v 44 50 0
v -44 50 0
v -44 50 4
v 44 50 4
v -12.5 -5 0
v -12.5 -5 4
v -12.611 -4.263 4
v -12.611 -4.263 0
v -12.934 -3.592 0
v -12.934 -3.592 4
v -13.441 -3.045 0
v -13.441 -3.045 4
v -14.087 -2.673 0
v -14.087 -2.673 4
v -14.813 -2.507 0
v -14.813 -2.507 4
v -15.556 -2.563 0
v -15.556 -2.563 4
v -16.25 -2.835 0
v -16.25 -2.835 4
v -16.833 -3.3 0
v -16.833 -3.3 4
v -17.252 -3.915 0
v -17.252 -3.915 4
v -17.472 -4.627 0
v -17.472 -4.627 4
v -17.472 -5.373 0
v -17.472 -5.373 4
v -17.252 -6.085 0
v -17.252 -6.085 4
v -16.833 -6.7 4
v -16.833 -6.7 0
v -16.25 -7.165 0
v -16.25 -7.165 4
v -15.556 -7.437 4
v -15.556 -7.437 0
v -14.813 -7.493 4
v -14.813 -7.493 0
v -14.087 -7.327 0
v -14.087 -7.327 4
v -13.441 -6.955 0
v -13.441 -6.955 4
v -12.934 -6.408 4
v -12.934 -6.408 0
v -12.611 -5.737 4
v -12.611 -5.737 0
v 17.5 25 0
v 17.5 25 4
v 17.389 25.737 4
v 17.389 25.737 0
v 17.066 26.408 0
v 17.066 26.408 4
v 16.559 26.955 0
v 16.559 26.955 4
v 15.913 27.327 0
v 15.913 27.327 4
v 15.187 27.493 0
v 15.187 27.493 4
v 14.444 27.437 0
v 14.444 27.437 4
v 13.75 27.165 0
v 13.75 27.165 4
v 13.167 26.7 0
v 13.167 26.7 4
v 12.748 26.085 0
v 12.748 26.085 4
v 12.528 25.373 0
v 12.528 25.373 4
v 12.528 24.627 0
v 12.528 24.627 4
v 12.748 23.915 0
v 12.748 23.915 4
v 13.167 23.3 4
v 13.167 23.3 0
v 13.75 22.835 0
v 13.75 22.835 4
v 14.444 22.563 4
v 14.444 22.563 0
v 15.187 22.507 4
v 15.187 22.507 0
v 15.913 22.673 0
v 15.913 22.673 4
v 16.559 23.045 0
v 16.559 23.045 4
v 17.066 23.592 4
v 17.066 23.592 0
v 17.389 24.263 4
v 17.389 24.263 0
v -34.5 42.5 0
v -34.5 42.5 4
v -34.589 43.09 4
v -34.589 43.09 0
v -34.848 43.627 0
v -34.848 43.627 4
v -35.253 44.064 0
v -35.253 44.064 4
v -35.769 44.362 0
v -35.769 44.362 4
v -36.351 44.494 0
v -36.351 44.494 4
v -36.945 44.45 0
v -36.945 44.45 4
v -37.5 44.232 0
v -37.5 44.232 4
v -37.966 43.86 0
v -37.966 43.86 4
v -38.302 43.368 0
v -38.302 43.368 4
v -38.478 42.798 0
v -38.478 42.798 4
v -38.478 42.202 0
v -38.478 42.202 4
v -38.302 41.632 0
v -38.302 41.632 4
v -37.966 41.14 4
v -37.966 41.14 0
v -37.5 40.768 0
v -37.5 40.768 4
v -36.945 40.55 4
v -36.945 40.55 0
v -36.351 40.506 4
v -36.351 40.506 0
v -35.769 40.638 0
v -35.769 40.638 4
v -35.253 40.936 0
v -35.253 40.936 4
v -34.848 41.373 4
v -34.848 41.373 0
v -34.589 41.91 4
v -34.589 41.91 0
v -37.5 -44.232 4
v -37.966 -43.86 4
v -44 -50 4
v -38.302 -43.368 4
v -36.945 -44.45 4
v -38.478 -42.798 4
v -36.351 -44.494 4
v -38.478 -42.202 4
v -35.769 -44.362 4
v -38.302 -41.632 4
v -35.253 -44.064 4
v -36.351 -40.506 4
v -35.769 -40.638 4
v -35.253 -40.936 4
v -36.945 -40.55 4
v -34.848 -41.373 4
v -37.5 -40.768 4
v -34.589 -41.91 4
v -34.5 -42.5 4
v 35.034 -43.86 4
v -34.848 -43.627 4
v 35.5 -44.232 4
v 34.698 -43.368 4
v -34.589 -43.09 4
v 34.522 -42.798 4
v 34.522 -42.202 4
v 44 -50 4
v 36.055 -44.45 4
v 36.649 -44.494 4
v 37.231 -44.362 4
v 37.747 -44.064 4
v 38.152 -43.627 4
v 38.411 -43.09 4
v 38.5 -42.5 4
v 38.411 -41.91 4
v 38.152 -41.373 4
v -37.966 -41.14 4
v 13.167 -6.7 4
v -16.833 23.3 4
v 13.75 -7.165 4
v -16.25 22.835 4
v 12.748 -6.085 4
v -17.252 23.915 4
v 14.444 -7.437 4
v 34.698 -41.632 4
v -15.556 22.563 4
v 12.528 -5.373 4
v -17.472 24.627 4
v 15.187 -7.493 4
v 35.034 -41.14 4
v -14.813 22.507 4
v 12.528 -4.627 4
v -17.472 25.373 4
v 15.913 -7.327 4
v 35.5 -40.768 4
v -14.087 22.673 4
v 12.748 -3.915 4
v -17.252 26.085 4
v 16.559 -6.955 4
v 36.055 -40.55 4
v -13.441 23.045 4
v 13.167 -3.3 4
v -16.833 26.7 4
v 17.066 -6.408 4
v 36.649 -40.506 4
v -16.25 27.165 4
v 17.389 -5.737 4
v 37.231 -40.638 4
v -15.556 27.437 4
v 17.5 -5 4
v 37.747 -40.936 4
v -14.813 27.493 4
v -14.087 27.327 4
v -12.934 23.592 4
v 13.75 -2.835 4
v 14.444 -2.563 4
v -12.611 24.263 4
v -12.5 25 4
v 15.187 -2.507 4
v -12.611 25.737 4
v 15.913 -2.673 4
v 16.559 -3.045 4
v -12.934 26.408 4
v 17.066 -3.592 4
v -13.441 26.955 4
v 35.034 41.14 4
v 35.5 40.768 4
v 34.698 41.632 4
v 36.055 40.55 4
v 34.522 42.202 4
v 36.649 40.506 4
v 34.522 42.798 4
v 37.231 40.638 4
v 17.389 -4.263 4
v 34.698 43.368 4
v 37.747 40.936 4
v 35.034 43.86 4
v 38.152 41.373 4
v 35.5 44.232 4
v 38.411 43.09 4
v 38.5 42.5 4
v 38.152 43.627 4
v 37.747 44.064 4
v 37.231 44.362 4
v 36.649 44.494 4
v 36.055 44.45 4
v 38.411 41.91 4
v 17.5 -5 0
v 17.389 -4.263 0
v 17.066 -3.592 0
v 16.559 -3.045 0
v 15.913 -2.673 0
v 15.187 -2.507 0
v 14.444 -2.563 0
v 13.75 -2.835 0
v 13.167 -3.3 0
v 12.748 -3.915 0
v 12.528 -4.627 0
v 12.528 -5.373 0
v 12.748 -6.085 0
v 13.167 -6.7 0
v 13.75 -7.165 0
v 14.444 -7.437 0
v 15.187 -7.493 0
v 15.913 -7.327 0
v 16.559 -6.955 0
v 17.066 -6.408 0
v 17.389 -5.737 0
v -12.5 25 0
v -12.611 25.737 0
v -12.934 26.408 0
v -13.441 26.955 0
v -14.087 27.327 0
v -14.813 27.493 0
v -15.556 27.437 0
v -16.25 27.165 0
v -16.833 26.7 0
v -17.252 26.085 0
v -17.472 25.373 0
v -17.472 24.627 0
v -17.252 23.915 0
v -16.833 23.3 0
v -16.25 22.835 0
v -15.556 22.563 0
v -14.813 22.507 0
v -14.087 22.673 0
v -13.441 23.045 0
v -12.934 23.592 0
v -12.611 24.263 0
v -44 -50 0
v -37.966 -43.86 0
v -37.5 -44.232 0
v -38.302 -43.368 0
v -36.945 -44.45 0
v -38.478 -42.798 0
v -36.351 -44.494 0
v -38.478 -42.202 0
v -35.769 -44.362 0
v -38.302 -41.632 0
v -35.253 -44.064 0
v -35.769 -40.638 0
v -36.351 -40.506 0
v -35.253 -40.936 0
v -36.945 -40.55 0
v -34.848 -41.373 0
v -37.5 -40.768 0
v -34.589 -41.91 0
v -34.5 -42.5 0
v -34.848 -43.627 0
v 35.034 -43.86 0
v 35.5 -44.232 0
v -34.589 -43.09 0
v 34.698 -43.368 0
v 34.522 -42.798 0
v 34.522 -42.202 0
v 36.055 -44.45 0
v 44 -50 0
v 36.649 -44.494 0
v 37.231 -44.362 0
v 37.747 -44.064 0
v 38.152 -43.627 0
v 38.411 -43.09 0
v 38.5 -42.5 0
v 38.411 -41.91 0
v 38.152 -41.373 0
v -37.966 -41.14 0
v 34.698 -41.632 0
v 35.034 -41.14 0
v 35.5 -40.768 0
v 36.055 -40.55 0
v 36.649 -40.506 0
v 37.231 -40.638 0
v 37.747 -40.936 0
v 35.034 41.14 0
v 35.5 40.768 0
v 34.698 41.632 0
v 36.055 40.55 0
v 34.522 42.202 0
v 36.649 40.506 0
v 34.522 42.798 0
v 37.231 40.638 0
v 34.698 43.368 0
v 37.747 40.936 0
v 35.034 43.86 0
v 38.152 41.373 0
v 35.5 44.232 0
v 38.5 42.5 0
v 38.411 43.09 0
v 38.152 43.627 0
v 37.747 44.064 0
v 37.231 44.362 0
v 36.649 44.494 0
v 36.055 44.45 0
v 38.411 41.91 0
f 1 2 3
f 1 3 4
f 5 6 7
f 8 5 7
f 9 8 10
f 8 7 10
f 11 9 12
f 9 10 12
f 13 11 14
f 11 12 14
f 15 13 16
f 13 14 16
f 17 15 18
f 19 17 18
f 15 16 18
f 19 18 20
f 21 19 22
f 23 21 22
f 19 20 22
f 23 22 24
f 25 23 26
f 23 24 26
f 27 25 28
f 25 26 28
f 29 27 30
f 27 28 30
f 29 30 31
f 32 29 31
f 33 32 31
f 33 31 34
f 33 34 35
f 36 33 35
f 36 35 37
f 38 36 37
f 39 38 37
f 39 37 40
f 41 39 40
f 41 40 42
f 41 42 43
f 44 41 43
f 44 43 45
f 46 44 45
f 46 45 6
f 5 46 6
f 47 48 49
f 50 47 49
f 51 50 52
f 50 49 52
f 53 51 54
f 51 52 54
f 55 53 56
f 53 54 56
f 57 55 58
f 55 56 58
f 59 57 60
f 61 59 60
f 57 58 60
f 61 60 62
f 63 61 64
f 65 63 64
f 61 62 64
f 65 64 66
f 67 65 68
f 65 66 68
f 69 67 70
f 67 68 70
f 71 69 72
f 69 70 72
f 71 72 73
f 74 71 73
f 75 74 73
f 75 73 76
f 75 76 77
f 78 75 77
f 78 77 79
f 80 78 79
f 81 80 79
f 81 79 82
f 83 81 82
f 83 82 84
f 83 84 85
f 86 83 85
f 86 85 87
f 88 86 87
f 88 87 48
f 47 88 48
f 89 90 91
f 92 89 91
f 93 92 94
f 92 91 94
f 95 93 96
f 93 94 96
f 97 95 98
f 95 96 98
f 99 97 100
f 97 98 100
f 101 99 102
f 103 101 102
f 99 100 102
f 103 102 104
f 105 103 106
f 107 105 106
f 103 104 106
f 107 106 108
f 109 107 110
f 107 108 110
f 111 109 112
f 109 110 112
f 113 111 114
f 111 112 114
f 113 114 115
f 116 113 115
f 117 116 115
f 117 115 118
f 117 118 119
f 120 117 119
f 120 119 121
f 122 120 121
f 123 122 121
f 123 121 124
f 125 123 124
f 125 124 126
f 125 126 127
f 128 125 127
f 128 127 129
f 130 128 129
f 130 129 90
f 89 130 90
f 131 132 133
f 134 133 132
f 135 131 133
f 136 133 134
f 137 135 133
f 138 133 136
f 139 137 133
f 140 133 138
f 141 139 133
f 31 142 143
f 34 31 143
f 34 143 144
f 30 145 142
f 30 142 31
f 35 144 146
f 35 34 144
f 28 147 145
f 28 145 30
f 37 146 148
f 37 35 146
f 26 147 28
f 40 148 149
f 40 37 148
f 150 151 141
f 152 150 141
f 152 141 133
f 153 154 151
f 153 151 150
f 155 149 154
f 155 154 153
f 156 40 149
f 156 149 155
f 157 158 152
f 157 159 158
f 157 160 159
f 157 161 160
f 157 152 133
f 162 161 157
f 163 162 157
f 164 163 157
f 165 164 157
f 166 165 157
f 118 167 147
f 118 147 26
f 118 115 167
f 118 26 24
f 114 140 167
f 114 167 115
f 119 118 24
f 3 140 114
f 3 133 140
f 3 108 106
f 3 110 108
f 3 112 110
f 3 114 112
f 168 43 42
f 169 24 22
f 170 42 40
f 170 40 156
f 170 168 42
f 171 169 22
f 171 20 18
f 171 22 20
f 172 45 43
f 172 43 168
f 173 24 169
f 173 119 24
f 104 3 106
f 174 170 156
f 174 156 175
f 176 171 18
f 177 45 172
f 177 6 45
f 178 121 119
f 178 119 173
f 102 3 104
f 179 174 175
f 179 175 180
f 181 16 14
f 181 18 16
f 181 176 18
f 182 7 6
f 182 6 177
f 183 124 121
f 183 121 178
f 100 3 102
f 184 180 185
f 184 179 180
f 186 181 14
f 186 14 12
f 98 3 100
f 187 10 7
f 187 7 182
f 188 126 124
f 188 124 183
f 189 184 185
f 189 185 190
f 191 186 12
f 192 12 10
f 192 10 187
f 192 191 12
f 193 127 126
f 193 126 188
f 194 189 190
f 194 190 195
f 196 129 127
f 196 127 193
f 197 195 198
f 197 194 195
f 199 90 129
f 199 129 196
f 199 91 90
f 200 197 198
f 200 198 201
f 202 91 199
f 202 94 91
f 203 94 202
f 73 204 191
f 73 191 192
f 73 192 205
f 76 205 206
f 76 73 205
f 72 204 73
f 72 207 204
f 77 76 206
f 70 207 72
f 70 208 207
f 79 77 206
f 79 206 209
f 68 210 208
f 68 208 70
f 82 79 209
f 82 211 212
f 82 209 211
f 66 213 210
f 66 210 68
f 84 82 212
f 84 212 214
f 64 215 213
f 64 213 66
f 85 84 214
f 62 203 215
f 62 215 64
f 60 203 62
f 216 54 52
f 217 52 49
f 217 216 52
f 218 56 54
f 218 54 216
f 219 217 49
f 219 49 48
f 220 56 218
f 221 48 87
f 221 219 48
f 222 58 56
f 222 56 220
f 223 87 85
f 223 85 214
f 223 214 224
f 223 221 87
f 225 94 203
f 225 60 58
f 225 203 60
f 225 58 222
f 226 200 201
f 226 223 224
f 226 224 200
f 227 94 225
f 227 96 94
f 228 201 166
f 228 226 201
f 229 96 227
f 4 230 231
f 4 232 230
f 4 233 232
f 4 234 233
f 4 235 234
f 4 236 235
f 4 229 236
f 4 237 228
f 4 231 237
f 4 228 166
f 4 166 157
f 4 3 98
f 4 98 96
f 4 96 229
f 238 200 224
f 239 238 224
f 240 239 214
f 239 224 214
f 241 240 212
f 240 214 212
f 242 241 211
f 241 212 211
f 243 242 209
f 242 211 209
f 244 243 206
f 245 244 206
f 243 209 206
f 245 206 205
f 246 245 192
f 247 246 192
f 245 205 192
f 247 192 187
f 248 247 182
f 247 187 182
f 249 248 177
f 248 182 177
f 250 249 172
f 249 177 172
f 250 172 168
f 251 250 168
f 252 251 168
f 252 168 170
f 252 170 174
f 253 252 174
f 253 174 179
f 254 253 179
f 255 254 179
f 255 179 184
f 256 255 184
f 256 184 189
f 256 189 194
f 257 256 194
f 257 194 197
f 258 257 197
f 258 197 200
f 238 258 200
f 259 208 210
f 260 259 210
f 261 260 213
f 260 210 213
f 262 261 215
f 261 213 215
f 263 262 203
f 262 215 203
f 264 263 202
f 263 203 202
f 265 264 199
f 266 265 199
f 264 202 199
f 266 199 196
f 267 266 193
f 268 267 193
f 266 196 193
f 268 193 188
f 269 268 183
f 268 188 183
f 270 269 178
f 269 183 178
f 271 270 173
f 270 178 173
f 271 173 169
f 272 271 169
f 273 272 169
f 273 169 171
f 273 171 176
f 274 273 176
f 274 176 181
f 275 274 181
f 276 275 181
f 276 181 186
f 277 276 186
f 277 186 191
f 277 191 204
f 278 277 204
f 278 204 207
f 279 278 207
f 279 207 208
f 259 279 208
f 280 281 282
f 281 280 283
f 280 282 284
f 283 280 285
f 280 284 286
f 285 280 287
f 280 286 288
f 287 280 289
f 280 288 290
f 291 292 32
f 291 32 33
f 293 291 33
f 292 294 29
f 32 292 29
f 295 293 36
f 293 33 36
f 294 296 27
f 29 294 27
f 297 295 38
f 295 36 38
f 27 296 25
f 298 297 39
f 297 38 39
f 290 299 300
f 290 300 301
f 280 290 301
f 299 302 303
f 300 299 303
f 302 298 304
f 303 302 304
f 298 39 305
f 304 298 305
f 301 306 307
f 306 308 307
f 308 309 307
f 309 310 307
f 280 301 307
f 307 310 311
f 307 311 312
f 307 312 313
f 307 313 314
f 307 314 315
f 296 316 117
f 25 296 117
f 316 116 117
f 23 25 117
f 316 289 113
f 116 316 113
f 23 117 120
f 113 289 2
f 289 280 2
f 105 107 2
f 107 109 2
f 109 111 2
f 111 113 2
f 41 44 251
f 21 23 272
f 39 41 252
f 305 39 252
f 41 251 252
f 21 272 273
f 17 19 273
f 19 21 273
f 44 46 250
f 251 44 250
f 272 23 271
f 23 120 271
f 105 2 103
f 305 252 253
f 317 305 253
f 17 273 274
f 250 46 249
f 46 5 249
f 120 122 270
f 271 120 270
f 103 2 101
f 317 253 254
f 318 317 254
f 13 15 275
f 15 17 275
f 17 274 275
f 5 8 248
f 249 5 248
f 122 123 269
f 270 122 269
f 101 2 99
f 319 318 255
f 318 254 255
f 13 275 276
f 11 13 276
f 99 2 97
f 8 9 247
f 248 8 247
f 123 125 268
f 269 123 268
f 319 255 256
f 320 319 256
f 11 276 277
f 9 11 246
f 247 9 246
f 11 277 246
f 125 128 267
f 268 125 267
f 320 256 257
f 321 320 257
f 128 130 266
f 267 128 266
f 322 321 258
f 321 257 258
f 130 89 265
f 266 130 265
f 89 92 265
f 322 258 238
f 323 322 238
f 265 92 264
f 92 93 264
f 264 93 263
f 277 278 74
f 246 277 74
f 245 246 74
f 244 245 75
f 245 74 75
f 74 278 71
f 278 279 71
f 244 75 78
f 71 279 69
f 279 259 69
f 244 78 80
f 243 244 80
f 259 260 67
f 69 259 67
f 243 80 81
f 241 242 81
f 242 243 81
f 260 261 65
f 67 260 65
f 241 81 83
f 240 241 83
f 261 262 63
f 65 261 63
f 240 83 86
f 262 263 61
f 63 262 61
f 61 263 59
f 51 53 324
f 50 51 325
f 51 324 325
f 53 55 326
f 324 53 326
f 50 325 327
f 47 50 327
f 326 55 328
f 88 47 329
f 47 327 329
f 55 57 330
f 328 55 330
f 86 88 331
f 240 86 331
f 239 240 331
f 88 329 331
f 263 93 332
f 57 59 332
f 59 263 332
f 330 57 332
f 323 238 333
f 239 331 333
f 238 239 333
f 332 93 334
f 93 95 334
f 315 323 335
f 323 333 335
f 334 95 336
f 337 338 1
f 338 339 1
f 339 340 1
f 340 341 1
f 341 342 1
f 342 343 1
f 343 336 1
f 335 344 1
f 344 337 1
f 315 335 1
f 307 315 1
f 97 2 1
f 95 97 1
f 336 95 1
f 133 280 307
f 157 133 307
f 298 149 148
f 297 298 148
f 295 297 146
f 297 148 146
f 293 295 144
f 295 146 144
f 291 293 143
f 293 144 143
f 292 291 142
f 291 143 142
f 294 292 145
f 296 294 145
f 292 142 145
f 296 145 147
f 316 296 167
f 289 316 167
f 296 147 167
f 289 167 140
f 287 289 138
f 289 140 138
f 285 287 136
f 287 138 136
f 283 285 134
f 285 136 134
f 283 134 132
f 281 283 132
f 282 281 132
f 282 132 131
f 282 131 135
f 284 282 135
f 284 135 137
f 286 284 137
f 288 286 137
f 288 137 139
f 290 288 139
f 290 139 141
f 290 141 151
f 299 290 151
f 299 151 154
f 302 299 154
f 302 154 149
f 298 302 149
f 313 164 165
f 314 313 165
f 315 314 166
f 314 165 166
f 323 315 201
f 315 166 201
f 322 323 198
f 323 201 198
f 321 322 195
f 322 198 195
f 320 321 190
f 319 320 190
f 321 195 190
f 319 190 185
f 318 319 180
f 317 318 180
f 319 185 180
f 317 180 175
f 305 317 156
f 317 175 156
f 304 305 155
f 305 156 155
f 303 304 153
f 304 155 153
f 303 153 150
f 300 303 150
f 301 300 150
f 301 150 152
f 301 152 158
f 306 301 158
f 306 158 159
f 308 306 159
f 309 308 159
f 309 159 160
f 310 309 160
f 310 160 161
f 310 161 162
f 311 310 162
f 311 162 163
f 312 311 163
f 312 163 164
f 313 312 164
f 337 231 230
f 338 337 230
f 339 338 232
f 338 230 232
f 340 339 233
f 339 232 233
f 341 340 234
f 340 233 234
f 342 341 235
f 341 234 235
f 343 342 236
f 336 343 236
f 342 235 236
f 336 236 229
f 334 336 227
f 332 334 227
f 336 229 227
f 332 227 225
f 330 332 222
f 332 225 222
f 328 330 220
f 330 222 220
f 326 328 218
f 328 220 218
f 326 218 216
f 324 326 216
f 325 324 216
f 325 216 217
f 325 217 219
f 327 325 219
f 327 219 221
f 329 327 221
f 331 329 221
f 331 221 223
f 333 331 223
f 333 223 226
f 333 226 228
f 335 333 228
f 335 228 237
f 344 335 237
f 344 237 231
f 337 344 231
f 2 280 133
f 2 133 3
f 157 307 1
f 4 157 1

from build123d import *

# Parameters (mm, degrees)
SKETCH_1_W          = 88
SKETCH_1_H          = 100
EXTRUDE_1_DEPTH     = 4
SKETCH_2_R          = 2
CUT_EXTRUDE_1_DEPTH = 67.72330927
SKETCH_3_R          = 2.5
CUT_EXTRUDE_2_DEPTH = 67.72330927


with BuildPart() as part:
    # 草图1 → 凸台-拉伸1 (new body)
    with BuildSketch(Plane.XY):
        Rectangle(SKETCH_1_W, SKETCH_1_H)
    extrude(amount=EXTRUDE_1_DEPTH)

    # 草图2 → 切除-拉伸1 (cut, through all)
    with BuildSketch(Plane.XY.offset(4)):
        with Locations((-36.5, 42.5)):
            Circle(SKETCH_2_R)
        with Locations((36.5, 42.5)):
            Circle(SKETCH_2_R)
        with Locations((36.5, -42.5)):
            Circle(SKETCH_2_R)
        with Locations((-36.5, -42.5)):
            Circle(SKETCH_2_R)
    extrude(amount=-CUT_EXTRUDE_1_DEPTH, mode=Mode.SUBTRACT)

    # 草图3 → 切除-拉伸2 (cut, through all)
    with BuildSketch(Plane.XY.offset(4)):
        with Locations((-15, 25)):
            Circle(SKETCH_3_R)
        with Locations((15, 25)):
            Circle(SKETCH_3_R)
        with Locations((15, -5)):
            Circle(SKETCH_3_R)
        with Locations((-15, -5)):
            Circle(SKETCH_3_R)
    extrude(amount=-CUT_EXTRUDE_2_DEPTH, mode=Mode.SUBTRACT)


solid = part.part
